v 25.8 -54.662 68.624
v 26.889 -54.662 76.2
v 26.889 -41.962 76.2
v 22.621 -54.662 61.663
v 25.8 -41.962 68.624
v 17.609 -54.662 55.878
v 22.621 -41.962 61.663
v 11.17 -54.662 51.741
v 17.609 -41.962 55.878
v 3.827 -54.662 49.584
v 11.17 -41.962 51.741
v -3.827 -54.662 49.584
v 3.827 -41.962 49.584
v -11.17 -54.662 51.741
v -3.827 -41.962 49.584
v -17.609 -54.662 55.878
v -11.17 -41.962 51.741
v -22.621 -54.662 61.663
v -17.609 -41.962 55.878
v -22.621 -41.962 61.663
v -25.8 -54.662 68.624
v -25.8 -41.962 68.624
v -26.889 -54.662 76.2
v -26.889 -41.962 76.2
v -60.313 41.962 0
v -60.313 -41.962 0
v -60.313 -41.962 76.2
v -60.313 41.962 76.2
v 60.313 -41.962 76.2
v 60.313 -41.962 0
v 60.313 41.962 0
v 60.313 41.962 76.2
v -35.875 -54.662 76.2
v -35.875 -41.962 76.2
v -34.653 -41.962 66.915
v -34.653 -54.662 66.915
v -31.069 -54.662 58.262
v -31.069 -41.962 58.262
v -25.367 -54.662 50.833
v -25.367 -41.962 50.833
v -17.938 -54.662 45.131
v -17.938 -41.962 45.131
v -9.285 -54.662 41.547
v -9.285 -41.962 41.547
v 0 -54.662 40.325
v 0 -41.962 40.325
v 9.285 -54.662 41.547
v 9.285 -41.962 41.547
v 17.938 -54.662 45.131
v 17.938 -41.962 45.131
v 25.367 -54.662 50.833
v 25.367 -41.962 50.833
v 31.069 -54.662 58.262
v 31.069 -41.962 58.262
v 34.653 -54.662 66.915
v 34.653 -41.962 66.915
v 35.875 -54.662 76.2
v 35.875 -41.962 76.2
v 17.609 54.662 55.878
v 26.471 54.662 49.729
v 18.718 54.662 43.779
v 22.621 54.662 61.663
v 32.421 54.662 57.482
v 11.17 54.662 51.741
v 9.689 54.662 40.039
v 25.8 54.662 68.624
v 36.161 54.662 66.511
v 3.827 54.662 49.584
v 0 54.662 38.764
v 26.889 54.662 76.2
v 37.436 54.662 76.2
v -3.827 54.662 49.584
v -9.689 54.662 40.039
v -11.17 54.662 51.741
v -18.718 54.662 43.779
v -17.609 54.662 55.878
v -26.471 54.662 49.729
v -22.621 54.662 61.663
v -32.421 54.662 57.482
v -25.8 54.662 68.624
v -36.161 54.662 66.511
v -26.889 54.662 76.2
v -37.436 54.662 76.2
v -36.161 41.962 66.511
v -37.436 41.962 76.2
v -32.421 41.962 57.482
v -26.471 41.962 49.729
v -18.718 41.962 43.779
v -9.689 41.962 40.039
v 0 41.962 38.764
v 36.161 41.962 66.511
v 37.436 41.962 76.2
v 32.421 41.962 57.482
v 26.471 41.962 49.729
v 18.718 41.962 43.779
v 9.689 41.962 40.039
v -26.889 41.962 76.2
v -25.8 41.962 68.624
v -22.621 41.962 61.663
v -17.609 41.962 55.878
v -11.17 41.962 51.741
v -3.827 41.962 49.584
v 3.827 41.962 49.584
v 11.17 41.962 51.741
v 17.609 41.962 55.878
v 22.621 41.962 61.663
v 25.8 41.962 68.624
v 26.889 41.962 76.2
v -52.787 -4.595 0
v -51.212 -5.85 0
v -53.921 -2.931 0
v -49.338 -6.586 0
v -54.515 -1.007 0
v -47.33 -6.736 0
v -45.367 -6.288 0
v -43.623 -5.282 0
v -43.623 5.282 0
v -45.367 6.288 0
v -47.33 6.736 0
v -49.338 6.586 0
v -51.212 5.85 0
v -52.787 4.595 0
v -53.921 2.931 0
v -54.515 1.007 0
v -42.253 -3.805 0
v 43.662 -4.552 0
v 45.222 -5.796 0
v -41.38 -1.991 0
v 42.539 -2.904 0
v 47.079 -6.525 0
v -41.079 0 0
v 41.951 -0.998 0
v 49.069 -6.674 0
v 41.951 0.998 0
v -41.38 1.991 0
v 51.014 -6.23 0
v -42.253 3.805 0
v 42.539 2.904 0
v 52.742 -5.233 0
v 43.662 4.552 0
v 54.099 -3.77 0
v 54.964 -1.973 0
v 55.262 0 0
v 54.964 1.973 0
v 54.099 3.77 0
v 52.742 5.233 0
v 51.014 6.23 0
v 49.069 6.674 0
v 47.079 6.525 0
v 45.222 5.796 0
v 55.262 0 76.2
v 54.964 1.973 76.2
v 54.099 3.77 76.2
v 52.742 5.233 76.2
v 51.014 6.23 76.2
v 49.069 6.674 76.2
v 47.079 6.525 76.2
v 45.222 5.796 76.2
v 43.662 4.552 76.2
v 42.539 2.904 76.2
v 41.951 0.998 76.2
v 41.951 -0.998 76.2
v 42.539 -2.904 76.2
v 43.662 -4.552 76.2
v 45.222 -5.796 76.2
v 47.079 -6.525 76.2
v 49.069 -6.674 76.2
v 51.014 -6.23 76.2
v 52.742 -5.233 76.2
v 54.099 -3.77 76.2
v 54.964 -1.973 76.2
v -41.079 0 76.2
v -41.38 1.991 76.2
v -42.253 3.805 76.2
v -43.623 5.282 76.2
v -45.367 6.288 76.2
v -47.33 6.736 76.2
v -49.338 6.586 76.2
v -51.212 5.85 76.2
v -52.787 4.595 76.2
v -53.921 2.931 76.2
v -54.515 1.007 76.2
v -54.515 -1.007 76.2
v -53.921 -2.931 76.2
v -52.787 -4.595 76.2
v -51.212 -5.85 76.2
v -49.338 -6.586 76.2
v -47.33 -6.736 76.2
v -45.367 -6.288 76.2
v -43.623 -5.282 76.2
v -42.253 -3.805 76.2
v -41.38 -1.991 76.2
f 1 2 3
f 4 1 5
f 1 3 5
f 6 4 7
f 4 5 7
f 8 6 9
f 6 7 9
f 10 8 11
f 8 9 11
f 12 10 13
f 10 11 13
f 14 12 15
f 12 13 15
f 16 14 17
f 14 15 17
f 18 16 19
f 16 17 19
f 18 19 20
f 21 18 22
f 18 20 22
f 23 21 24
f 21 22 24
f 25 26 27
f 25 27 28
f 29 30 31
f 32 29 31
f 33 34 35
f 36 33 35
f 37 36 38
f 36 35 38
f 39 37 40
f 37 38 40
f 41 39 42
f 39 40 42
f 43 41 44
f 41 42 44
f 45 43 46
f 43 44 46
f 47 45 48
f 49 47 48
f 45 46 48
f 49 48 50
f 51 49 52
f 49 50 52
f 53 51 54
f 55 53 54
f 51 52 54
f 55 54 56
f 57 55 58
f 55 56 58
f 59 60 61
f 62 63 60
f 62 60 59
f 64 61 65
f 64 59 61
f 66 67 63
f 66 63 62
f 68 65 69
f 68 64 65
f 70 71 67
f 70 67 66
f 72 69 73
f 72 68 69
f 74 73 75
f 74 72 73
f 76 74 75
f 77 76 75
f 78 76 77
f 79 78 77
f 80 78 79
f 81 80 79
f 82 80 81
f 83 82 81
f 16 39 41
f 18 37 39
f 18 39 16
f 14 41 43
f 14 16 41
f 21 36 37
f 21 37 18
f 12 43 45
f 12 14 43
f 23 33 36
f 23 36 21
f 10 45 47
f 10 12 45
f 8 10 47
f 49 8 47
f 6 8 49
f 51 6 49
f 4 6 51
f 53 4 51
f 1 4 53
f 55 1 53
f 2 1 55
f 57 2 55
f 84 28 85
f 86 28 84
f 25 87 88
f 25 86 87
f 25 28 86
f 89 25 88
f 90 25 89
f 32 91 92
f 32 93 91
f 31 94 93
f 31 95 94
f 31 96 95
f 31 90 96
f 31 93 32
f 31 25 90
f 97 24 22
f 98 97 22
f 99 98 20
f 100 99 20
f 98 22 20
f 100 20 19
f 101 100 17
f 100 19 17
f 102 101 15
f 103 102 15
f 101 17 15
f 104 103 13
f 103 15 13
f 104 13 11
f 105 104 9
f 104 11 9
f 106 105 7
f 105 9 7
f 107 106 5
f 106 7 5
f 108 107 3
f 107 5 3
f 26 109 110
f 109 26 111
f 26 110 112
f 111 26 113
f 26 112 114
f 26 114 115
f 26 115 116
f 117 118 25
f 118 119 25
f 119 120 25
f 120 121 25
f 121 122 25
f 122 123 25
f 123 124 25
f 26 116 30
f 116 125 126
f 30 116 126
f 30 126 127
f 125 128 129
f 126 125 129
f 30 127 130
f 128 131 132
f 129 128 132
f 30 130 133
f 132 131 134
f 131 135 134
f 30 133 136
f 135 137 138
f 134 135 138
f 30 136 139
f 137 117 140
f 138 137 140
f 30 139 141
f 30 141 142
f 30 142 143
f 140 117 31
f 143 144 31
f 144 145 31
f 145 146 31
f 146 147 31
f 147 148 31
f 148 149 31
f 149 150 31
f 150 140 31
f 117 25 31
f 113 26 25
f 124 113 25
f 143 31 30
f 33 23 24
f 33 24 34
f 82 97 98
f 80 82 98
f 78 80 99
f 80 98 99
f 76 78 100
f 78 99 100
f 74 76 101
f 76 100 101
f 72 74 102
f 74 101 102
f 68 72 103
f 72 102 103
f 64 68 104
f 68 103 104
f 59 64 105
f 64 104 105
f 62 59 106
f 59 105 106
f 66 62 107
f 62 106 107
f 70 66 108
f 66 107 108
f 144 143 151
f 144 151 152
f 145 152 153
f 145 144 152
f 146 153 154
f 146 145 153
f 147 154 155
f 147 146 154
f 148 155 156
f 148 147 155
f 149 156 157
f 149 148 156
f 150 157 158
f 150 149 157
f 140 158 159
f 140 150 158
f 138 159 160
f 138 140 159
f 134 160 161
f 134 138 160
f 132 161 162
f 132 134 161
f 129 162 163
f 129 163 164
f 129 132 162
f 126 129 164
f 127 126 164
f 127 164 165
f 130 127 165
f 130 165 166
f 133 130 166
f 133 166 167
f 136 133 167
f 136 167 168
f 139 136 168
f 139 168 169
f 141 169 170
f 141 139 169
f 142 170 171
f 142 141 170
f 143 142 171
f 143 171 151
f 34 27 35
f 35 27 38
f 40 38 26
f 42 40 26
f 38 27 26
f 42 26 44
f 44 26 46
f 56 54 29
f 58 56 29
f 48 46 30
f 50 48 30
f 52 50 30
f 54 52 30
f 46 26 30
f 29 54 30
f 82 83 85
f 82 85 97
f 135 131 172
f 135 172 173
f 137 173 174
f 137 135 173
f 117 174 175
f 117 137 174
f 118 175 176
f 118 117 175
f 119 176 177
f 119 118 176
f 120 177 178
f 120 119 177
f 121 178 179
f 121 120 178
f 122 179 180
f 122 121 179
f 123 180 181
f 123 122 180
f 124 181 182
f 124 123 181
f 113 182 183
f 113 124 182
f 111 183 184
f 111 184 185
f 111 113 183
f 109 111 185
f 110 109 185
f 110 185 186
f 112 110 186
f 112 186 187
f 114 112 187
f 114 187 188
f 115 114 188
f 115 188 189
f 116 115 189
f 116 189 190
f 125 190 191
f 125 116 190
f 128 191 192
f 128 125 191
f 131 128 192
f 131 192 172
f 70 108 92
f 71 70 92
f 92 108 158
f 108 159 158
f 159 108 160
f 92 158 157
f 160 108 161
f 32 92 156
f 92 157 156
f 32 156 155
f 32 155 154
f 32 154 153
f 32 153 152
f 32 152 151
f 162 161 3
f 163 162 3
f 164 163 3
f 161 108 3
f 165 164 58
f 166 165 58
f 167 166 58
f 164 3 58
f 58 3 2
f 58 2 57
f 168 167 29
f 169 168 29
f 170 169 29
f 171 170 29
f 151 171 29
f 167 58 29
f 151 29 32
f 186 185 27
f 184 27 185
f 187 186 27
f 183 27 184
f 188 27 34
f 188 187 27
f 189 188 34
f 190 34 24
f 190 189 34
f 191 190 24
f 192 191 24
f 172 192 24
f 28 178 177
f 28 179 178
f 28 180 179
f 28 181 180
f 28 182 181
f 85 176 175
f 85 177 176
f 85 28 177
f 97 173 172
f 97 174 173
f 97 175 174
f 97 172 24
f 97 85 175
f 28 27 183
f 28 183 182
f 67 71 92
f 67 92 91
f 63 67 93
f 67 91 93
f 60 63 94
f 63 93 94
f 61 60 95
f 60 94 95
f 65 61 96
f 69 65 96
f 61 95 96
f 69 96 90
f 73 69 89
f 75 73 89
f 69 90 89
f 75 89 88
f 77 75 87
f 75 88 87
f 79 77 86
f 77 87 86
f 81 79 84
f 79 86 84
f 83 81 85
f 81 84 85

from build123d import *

# Parameters (mm, degrees)
F0_W     = 120.626696
F0_H     = 83.924868
F0_R     = 6.75531
F0_R_2   = 6.692983
F1_DEPTH = 76.2
F2_R     = 26.889351
F3_DEPTH = 101.6
F5_DEPTH = 12.7
F7_DEPTH = 12.7


with BuildPart() as f1:
    # F0 (on Top) → F1 (new body)
    with BuildSketch(Plane.XY):
        Rectangle(F0_W, F0_H)
        with Locations((-47.834724, 0)):
            Circle(F0_R, mode=Mode.SUBTRACT)
        with Locations((48.568763, 0)):
            Circle(F0_R_2, mode=Mode.SUBTRACT)
    extrude(amount=F1_DEPTH)

    # F2 (on face) → F3 (cut)
    with BuildSketch(Plane.XZ.offset(41.962434)):
        with Locations((0, 76.2)):
            Circle(F2_R)
    extrude(amount=-F3_DEPTH, mode=Mode.SUBTRACT)

    # F4 (on face) → F5 (join)
    with BuildSketch(Plane.XZ.offset(41.962434)):
        with BuildLine():
            Line((-26.889351, 76.2), (-35.875045, 76.2))
            ThreePointArc((-35.875045, 76.2), (0, 40.324955), (35.875045, 76.2))
            Line((35.875045, 76.2), (26.889351, 76.2))
            ThreePointArc((26.889351, 76.2), (0, 49.310649), (-26.889351, 76.2))
        make_face()
    extrude(amount=F5_DEPTH)

    # F6 (on face) → F7 (join)
    with BuildSketch(Plane(origin=(0, 41.962434, 0), x_dir=(-1, 0, 0), z_dir=(0, 1, 0))):
        with BuildLine():
            Line((-26.889351, 76.2), (-37.436254, 76.2))
            ThreePointArc((-37.436254, 76.2), (0, 38.763746), (37.436254, 76.2))
            Line((37.436254, 76.2), (26.889351, 76.2))
            ThreePointArc((26.889351, 76.2), (0, 49.310649), (-26.889351, 76.2))
        make_face()
    extrude(amount=F7_DEPTH)


solid = f1.part
